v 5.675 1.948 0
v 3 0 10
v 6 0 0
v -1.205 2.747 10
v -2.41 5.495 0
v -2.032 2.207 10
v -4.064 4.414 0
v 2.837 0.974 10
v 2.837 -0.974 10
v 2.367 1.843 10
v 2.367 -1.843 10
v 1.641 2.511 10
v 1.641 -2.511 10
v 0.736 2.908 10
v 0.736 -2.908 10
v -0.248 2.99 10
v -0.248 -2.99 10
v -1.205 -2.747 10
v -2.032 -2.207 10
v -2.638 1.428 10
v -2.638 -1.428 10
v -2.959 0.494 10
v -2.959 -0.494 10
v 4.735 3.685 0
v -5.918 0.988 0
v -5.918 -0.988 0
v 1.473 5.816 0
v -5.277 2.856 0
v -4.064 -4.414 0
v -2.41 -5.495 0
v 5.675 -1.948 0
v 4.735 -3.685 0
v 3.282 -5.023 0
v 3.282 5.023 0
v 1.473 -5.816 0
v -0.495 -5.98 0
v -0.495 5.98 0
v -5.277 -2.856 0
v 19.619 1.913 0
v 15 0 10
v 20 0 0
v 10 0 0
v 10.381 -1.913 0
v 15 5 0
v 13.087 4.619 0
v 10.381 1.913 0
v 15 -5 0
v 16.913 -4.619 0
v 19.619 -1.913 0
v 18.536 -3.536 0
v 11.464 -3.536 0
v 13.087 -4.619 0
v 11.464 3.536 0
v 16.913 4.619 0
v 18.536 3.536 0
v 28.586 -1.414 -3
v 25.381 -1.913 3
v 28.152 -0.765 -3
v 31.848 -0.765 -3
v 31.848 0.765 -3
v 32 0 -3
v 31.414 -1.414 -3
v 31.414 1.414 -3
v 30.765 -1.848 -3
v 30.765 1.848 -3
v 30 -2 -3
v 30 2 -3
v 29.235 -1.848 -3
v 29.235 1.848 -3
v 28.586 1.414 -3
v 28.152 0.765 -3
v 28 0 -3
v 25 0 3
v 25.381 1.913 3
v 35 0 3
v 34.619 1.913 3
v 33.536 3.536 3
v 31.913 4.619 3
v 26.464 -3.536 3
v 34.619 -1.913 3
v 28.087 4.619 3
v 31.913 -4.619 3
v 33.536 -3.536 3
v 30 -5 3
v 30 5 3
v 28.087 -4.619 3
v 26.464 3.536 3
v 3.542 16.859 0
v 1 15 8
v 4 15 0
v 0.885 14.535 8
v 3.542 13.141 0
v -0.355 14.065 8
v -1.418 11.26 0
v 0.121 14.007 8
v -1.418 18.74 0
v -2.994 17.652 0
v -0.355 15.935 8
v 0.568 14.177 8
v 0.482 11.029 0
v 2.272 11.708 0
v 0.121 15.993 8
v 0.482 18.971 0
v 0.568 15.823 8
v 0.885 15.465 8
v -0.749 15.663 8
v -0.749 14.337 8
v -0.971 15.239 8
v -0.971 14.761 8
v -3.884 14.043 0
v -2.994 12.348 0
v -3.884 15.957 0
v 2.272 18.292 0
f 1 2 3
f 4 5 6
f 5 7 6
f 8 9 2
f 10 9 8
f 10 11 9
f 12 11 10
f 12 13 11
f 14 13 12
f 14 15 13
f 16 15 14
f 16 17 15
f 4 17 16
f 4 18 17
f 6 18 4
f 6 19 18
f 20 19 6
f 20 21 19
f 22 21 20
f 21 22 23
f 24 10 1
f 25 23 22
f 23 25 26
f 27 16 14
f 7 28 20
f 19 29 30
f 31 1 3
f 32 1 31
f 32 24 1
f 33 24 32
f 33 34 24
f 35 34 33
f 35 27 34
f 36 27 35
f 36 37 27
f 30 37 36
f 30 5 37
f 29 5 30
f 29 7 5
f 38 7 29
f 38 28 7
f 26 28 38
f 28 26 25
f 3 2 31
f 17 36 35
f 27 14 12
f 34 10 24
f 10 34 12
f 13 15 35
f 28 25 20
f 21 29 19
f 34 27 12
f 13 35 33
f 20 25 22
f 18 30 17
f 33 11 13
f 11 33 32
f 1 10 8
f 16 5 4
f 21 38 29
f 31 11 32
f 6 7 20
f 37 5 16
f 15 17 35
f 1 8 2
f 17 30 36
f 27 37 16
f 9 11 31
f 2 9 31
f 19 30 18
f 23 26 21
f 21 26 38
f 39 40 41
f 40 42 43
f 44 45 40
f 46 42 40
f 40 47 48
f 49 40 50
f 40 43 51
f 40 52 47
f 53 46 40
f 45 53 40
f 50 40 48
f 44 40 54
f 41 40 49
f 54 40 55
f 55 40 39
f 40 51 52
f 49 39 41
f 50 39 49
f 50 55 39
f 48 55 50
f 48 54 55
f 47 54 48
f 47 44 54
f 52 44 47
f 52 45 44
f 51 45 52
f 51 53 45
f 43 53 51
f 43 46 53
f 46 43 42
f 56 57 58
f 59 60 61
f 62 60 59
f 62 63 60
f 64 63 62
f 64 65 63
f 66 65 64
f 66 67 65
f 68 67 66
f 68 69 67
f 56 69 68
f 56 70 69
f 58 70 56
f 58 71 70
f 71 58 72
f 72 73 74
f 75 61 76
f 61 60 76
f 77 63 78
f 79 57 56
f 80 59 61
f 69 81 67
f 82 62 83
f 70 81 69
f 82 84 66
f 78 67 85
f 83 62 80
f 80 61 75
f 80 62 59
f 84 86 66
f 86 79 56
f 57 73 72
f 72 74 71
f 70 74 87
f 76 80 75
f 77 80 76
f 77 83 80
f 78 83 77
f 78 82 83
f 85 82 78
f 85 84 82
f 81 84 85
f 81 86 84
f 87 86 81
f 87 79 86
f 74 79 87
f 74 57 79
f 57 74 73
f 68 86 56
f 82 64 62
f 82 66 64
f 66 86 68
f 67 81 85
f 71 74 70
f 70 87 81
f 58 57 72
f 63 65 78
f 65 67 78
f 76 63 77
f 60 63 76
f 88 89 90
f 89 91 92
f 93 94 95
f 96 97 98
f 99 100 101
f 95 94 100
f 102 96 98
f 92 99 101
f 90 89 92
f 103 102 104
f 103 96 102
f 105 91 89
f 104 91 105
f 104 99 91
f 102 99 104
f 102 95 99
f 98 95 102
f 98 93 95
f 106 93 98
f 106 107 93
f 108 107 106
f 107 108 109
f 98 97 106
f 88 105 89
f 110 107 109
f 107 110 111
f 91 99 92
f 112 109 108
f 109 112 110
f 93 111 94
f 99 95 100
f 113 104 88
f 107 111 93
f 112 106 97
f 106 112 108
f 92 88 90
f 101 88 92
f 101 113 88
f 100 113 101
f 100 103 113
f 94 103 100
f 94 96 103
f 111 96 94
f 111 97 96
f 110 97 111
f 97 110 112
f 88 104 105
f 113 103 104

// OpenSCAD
// Zweck: cones and truncated cones via r1/r2, d1/d2 and apex (d2 = 0).
cylinder(h = 10, r1 = 6, r2 = 3);
translate([15, 0, 0]) cylinder(h = 10, d1 = 10, d2 = 0);
translate([30, 0, 0]) cylinder(h = 6, r1 = 2, r2 = 5, center = true);
translate([0, 15, 0]) cylinder(8, 4, 1);
